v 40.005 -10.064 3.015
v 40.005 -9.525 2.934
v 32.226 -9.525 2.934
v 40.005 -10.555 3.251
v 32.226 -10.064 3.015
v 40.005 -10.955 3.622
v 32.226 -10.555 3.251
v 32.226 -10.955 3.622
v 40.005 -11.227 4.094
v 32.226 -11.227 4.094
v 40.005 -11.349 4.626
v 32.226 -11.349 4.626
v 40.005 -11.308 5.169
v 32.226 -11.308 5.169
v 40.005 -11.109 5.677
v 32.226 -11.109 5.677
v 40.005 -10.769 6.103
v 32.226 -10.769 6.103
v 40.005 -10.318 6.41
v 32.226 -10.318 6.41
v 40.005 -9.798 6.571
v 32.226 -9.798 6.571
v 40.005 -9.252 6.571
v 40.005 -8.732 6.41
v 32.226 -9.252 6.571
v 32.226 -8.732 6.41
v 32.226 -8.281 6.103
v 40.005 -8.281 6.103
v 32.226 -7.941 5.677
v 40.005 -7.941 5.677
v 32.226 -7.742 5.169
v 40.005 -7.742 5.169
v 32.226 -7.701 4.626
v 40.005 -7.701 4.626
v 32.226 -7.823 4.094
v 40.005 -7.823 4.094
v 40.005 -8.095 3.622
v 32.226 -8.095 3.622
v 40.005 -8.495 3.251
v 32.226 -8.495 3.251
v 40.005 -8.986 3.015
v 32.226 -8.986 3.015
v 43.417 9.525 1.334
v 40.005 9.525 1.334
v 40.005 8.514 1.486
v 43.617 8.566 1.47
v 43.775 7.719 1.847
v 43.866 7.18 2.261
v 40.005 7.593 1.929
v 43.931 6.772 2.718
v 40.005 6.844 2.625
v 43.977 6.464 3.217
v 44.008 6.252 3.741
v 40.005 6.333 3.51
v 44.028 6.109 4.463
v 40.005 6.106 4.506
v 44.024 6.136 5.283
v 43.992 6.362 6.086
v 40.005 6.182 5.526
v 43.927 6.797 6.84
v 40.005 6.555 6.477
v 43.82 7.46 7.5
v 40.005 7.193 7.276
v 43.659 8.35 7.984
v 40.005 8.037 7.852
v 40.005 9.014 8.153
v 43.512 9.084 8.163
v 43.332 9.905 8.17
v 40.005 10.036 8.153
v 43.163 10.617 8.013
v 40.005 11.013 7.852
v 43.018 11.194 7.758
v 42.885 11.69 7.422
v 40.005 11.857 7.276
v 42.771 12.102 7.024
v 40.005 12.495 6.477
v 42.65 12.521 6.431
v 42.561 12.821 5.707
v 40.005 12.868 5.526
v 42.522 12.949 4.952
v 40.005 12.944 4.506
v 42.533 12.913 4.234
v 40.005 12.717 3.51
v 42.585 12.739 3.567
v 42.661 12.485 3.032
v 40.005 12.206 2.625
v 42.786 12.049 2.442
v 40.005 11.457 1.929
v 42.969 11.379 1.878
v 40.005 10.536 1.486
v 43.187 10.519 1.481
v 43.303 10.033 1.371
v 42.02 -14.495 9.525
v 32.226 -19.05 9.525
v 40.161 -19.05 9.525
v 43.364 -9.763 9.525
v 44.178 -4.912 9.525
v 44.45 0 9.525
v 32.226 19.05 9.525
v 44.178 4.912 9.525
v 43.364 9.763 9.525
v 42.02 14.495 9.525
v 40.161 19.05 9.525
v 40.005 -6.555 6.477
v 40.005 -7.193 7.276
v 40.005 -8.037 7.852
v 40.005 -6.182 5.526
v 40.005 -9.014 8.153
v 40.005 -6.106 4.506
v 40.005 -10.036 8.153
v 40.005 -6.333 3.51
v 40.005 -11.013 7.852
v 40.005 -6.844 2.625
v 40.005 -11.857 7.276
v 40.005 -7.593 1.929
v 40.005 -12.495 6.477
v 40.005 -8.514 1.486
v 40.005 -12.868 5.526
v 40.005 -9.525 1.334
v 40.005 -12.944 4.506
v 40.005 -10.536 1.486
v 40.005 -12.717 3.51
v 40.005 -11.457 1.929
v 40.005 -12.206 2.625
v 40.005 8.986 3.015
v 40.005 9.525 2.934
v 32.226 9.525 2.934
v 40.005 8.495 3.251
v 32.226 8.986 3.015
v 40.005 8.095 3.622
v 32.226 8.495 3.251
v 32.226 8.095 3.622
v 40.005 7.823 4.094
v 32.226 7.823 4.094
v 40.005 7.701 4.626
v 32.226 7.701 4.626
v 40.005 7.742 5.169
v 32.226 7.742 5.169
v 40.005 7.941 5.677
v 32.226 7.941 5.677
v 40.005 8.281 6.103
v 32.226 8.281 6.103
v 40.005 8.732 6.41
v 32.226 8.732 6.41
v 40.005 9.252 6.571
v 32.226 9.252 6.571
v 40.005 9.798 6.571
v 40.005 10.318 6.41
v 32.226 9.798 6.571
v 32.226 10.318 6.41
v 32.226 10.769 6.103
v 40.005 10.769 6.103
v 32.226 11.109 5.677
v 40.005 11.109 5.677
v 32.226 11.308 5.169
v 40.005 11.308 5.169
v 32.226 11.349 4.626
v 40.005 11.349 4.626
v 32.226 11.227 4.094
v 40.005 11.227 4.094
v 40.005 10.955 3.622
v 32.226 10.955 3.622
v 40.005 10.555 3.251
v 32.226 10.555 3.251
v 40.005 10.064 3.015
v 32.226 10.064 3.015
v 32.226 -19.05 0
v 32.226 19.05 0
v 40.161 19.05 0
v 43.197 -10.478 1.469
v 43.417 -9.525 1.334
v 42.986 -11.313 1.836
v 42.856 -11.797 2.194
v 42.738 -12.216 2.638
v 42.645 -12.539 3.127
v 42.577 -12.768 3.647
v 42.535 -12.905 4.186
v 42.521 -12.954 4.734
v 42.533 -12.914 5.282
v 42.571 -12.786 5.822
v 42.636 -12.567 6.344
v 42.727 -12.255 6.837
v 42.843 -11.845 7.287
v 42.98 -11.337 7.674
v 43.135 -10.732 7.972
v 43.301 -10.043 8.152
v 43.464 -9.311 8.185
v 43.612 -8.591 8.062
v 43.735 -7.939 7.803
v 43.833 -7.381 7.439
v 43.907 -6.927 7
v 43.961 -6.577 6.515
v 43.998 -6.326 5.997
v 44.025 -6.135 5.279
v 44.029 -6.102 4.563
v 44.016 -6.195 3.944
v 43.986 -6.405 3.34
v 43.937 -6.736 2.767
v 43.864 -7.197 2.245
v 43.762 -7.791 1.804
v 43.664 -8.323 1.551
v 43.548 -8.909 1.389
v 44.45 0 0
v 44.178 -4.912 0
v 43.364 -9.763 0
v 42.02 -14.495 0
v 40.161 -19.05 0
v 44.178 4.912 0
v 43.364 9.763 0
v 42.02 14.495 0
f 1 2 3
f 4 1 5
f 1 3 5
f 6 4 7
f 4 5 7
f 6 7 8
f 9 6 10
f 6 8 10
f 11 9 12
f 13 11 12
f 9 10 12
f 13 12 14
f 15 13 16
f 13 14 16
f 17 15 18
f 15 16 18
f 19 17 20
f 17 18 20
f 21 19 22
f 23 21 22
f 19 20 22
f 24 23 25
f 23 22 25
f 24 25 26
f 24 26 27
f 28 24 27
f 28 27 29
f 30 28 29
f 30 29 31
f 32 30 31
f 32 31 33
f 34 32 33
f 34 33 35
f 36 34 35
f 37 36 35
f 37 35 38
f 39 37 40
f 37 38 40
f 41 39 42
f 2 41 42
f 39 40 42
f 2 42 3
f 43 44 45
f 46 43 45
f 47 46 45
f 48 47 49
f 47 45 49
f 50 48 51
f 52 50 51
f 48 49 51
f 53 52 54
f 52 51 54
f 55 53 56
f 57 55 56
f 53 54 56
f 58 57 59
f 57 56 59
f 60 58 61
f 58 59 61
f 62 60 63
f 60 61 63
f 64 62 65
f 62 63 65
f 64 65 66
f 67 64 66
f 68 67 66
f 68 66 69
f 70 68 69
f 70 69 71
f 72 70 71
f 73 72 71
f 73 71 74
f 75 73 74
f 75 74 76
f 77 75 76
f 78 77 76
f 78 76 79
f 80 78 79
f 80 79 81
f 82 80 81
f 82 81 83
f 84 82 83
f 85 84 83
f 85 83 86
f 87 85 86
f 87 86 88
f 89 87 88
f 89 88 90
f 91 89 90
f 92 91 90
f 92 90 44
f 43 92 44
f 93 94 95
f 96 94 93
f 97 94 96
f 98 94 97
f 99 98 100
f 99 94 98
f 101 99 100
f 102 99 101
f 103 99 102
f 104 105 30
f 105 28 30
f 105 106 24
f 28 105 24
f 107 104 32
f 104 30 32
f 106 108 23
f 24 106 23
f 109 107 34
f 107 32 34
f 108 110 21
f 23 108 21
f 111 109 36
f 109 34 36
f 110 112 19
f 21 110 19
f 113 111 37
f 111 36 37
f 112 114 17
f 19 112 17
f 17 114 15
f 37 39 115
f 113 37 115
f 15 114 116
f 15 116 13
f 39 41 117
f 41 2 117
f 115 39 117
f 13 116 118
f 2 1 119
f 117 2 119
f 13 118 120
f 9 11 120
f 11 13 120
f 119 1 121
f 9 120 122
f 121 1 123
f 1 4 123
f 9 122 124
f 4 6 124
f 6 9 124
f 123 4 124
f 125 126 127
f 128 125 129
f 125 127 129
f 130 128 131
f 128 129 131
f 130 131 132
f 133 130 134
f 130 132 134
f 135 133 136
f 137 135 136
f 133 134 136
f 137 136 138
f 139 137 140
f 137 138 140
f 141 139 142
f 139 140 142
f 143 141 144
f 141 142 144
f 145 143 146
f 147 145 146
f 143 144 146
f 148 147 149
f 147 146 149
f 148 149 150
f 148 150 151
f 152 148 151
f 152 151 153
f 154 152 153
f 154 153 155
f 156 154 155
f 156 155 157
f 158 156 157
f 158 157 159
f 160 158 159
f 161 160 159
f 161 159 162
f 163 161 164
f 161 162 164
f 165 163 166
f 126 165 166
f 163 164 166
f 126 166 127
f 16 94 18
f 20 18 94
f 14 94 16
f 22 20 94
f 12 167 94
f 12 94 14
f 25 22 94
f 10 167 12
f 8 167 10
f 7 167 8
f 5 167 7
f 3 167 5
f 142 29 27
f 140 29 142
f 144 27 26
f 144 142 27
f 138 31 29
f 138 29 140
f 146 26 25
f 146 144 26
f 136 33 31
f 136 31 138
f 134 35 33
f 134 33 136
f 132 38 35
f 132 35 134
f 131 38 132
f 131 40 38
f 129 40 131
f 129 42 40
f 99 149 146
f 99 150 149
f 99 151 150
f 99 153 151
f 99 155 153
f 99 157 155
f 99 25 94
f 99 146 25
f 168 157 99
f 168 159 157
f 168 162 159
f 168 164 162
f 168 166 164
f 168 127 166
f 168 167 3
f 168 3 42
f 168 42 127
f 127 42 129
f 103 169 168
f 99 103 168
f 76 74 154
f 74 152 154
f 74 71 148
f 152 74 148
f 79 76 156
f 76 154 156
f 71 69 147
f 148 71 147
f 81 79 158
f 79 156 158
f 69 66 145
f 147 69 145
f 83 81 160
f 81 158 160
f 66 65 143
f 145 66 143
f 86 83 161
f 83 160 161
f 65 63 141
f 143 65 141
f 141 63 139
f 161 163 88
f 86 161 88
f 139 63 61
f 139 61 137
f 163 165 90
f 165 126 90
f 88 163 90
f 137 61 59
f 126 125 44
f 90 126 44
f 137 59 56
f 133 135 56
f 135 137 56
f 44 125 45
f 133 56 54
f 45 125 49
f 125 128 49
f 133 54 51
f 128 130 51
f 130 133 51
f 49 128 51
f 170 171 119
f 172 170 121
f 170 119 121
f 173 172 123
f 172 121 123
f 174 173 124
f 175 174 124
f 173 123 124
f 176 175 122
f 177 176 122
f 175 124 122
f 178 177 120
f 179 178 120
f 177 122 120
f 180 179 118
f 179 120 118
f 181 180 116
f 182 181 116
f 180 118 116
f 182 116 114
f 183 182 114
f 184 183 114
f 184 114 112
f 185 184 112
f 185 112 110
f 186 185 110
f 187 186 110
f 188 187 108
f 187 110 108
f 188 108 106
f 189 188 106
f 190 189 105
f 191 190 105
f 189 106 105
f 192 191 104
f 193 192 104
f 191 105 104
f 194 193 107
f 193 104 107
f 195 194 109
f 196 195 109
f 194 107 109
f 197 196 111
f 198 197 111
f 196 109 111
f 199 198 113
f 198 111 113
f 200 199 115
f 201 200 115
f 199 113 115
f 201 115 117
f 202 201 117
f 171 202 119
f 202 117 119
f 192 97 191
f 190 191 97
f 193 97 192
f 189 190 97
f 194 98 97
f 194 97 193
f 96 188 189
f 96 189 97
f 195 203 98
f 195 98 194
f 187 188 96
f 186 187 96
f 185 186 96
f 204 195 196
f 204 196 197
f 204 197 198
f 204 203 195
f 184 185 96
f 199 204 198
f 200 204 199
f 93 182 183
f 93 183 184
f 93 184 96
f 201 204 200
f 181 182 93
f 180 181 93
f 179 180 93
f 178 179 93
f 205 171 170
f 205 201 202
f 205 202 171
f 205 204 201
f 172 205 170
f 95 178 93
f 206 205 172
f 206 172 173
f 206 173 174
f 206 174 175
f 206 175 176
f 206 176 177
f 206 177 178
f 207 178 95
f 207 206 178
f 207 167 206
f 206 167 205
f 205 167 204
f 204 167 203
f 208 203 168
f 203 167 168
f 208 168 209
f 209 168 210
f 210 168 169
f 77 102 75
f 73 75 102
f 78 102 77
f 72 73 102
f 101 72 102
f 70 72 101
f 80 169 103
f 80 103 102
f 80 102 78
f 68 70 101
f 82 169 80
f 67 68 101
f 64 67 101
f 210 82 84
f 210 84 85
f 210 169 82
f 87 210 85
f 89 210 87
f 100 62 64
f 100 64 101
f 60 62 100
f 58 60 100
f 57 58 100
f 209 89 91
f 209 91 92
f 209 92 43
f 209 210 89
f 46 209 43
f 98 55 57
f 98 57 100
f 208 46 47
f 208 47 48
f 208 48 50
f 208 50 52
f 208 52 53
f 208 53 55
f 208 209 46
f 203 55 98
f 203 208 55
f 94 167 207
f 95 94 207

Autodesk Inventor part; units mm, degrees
ref_plane "XZ Plane" through (0, 0, 0) normal (0, 1, 0) x (-1, 0, 0)
ref_plane "XY Plane" through (0, 0, 0) normal (0, 0, 1) x (1, 0, 0)
sketch "Sketch1" plane through (0, 0, 0) normal (0, 0, 1) x (1, 0, 0)
  circle A0 centre (0, 0) radius 44.45
  line L0 (-32.2263, -21.7487) -> (32.2263, -21.7487) construction
  line L1 (32.2263, -21.7487) -> (32.2263, 21.7487)
  line L2 (32.2263, 21.7487) -> (-32.2263, 21.7487) construction
  line L3 (-32.2263, 21.7487) -> (-32.2263, -21.7487) construction
  line L4 (-32.2263, -21.7487) -> (32.2263, 21.7487) construction
  line L5 (32.2263, -21.7487) -> (-32.2263, 21.7487) construction
  line L6 (-23.8125, -30.1625) -> (23.8125, -30.1625) construction
  line L7 (23.8125, -30.1625) -> (23.8125, 30.1625) construction
  line L8 (23.8125, 30.1625) -> (-23.8125, 30.1625) construction
  line L9 (-23.8125, 30.1625) -> (-23.8125, -30.1625) construction
  line L10 (-23.8125, -30.1625) -> (23.8125, 30.1625) construction
  line L11 (23.8125, -30.1625) -> (-23.8125, 30.1625) construction
  line L12 (-32.2263, 21.7487) -> (-23.8125, 30.1625) construction
  line L13 (-32.2263, -21.7487) -> (-23.8125, -30.1625) construction
  line L14 (23.8125, -30.1625) -> (32.2263, -21.7487) construction
  line L15 (32.2263, 21.7487) -> (23.8125, 30.1625) construction
  line L16 (32.2263, 0) -> (44.45, 0) construction
  line L17 (40.1609, 19.05) -> (32.2263, 19.05)
  line L18 (32.2263, -19.05) -> (40.1609, -19.05)
  dimension "d0" = 88.9
  dimension "d2" = 64.4525
  dimension "d5" = 47.625
  dimension "d6" = 60.325
  dimension "d18" = 45
  dimension "d22" = 19.05
  dimension "d23" = 19.05
extrude "Extrusion1" add sketch "Sketch1" along normal blind 9.525 contours A0 L18 L1 L17 picked at (36.3009, 0)
ref_plane "Work Plane1" through (44.45, 0, 0) normal (1, 0, 0) x (0, 1, 0)
sketch "Sketch2" plane through (44.45, 0, 0) normal (1, 0, 0) x (0, 1, 0)
  line L0 (0, 9.9848) -> (0, 0) construction
  line L1 (-19.05, 4.7625) -> (19.05, 4.7625) construction
  line L2 (19.05, 0) -> (-19.05, 0) projected
  line L3 (-19.05, 0) -> (-19.05, 9.525) projected
  line L4 (19.05, 9.525) -> (-19.05, 9.525) projected
  line L5 (19.05, 0) -> (19.05, 9.525) projected
  point P0 (-9.525, 4.7625)
  point P1 (9.525, 4.7625)
  dimension "d9" = 19.05
  dimension "d10" = 9.525
hole "Hole2" at (44.45, -9.525, 4.7625) at (44.45, 9.525, 4.7625) direction (-1, 0, 0) diameter 3.6576 end through all counterbore diameter 6.858 counterbore depth 4.445 clearance for "Socket Head Cap Screw" size "#6" standard "Ansi Unified Screw Threads"
equation "\"d10\" = 0.5 * d9"
properties part number "Radial Bushing"
